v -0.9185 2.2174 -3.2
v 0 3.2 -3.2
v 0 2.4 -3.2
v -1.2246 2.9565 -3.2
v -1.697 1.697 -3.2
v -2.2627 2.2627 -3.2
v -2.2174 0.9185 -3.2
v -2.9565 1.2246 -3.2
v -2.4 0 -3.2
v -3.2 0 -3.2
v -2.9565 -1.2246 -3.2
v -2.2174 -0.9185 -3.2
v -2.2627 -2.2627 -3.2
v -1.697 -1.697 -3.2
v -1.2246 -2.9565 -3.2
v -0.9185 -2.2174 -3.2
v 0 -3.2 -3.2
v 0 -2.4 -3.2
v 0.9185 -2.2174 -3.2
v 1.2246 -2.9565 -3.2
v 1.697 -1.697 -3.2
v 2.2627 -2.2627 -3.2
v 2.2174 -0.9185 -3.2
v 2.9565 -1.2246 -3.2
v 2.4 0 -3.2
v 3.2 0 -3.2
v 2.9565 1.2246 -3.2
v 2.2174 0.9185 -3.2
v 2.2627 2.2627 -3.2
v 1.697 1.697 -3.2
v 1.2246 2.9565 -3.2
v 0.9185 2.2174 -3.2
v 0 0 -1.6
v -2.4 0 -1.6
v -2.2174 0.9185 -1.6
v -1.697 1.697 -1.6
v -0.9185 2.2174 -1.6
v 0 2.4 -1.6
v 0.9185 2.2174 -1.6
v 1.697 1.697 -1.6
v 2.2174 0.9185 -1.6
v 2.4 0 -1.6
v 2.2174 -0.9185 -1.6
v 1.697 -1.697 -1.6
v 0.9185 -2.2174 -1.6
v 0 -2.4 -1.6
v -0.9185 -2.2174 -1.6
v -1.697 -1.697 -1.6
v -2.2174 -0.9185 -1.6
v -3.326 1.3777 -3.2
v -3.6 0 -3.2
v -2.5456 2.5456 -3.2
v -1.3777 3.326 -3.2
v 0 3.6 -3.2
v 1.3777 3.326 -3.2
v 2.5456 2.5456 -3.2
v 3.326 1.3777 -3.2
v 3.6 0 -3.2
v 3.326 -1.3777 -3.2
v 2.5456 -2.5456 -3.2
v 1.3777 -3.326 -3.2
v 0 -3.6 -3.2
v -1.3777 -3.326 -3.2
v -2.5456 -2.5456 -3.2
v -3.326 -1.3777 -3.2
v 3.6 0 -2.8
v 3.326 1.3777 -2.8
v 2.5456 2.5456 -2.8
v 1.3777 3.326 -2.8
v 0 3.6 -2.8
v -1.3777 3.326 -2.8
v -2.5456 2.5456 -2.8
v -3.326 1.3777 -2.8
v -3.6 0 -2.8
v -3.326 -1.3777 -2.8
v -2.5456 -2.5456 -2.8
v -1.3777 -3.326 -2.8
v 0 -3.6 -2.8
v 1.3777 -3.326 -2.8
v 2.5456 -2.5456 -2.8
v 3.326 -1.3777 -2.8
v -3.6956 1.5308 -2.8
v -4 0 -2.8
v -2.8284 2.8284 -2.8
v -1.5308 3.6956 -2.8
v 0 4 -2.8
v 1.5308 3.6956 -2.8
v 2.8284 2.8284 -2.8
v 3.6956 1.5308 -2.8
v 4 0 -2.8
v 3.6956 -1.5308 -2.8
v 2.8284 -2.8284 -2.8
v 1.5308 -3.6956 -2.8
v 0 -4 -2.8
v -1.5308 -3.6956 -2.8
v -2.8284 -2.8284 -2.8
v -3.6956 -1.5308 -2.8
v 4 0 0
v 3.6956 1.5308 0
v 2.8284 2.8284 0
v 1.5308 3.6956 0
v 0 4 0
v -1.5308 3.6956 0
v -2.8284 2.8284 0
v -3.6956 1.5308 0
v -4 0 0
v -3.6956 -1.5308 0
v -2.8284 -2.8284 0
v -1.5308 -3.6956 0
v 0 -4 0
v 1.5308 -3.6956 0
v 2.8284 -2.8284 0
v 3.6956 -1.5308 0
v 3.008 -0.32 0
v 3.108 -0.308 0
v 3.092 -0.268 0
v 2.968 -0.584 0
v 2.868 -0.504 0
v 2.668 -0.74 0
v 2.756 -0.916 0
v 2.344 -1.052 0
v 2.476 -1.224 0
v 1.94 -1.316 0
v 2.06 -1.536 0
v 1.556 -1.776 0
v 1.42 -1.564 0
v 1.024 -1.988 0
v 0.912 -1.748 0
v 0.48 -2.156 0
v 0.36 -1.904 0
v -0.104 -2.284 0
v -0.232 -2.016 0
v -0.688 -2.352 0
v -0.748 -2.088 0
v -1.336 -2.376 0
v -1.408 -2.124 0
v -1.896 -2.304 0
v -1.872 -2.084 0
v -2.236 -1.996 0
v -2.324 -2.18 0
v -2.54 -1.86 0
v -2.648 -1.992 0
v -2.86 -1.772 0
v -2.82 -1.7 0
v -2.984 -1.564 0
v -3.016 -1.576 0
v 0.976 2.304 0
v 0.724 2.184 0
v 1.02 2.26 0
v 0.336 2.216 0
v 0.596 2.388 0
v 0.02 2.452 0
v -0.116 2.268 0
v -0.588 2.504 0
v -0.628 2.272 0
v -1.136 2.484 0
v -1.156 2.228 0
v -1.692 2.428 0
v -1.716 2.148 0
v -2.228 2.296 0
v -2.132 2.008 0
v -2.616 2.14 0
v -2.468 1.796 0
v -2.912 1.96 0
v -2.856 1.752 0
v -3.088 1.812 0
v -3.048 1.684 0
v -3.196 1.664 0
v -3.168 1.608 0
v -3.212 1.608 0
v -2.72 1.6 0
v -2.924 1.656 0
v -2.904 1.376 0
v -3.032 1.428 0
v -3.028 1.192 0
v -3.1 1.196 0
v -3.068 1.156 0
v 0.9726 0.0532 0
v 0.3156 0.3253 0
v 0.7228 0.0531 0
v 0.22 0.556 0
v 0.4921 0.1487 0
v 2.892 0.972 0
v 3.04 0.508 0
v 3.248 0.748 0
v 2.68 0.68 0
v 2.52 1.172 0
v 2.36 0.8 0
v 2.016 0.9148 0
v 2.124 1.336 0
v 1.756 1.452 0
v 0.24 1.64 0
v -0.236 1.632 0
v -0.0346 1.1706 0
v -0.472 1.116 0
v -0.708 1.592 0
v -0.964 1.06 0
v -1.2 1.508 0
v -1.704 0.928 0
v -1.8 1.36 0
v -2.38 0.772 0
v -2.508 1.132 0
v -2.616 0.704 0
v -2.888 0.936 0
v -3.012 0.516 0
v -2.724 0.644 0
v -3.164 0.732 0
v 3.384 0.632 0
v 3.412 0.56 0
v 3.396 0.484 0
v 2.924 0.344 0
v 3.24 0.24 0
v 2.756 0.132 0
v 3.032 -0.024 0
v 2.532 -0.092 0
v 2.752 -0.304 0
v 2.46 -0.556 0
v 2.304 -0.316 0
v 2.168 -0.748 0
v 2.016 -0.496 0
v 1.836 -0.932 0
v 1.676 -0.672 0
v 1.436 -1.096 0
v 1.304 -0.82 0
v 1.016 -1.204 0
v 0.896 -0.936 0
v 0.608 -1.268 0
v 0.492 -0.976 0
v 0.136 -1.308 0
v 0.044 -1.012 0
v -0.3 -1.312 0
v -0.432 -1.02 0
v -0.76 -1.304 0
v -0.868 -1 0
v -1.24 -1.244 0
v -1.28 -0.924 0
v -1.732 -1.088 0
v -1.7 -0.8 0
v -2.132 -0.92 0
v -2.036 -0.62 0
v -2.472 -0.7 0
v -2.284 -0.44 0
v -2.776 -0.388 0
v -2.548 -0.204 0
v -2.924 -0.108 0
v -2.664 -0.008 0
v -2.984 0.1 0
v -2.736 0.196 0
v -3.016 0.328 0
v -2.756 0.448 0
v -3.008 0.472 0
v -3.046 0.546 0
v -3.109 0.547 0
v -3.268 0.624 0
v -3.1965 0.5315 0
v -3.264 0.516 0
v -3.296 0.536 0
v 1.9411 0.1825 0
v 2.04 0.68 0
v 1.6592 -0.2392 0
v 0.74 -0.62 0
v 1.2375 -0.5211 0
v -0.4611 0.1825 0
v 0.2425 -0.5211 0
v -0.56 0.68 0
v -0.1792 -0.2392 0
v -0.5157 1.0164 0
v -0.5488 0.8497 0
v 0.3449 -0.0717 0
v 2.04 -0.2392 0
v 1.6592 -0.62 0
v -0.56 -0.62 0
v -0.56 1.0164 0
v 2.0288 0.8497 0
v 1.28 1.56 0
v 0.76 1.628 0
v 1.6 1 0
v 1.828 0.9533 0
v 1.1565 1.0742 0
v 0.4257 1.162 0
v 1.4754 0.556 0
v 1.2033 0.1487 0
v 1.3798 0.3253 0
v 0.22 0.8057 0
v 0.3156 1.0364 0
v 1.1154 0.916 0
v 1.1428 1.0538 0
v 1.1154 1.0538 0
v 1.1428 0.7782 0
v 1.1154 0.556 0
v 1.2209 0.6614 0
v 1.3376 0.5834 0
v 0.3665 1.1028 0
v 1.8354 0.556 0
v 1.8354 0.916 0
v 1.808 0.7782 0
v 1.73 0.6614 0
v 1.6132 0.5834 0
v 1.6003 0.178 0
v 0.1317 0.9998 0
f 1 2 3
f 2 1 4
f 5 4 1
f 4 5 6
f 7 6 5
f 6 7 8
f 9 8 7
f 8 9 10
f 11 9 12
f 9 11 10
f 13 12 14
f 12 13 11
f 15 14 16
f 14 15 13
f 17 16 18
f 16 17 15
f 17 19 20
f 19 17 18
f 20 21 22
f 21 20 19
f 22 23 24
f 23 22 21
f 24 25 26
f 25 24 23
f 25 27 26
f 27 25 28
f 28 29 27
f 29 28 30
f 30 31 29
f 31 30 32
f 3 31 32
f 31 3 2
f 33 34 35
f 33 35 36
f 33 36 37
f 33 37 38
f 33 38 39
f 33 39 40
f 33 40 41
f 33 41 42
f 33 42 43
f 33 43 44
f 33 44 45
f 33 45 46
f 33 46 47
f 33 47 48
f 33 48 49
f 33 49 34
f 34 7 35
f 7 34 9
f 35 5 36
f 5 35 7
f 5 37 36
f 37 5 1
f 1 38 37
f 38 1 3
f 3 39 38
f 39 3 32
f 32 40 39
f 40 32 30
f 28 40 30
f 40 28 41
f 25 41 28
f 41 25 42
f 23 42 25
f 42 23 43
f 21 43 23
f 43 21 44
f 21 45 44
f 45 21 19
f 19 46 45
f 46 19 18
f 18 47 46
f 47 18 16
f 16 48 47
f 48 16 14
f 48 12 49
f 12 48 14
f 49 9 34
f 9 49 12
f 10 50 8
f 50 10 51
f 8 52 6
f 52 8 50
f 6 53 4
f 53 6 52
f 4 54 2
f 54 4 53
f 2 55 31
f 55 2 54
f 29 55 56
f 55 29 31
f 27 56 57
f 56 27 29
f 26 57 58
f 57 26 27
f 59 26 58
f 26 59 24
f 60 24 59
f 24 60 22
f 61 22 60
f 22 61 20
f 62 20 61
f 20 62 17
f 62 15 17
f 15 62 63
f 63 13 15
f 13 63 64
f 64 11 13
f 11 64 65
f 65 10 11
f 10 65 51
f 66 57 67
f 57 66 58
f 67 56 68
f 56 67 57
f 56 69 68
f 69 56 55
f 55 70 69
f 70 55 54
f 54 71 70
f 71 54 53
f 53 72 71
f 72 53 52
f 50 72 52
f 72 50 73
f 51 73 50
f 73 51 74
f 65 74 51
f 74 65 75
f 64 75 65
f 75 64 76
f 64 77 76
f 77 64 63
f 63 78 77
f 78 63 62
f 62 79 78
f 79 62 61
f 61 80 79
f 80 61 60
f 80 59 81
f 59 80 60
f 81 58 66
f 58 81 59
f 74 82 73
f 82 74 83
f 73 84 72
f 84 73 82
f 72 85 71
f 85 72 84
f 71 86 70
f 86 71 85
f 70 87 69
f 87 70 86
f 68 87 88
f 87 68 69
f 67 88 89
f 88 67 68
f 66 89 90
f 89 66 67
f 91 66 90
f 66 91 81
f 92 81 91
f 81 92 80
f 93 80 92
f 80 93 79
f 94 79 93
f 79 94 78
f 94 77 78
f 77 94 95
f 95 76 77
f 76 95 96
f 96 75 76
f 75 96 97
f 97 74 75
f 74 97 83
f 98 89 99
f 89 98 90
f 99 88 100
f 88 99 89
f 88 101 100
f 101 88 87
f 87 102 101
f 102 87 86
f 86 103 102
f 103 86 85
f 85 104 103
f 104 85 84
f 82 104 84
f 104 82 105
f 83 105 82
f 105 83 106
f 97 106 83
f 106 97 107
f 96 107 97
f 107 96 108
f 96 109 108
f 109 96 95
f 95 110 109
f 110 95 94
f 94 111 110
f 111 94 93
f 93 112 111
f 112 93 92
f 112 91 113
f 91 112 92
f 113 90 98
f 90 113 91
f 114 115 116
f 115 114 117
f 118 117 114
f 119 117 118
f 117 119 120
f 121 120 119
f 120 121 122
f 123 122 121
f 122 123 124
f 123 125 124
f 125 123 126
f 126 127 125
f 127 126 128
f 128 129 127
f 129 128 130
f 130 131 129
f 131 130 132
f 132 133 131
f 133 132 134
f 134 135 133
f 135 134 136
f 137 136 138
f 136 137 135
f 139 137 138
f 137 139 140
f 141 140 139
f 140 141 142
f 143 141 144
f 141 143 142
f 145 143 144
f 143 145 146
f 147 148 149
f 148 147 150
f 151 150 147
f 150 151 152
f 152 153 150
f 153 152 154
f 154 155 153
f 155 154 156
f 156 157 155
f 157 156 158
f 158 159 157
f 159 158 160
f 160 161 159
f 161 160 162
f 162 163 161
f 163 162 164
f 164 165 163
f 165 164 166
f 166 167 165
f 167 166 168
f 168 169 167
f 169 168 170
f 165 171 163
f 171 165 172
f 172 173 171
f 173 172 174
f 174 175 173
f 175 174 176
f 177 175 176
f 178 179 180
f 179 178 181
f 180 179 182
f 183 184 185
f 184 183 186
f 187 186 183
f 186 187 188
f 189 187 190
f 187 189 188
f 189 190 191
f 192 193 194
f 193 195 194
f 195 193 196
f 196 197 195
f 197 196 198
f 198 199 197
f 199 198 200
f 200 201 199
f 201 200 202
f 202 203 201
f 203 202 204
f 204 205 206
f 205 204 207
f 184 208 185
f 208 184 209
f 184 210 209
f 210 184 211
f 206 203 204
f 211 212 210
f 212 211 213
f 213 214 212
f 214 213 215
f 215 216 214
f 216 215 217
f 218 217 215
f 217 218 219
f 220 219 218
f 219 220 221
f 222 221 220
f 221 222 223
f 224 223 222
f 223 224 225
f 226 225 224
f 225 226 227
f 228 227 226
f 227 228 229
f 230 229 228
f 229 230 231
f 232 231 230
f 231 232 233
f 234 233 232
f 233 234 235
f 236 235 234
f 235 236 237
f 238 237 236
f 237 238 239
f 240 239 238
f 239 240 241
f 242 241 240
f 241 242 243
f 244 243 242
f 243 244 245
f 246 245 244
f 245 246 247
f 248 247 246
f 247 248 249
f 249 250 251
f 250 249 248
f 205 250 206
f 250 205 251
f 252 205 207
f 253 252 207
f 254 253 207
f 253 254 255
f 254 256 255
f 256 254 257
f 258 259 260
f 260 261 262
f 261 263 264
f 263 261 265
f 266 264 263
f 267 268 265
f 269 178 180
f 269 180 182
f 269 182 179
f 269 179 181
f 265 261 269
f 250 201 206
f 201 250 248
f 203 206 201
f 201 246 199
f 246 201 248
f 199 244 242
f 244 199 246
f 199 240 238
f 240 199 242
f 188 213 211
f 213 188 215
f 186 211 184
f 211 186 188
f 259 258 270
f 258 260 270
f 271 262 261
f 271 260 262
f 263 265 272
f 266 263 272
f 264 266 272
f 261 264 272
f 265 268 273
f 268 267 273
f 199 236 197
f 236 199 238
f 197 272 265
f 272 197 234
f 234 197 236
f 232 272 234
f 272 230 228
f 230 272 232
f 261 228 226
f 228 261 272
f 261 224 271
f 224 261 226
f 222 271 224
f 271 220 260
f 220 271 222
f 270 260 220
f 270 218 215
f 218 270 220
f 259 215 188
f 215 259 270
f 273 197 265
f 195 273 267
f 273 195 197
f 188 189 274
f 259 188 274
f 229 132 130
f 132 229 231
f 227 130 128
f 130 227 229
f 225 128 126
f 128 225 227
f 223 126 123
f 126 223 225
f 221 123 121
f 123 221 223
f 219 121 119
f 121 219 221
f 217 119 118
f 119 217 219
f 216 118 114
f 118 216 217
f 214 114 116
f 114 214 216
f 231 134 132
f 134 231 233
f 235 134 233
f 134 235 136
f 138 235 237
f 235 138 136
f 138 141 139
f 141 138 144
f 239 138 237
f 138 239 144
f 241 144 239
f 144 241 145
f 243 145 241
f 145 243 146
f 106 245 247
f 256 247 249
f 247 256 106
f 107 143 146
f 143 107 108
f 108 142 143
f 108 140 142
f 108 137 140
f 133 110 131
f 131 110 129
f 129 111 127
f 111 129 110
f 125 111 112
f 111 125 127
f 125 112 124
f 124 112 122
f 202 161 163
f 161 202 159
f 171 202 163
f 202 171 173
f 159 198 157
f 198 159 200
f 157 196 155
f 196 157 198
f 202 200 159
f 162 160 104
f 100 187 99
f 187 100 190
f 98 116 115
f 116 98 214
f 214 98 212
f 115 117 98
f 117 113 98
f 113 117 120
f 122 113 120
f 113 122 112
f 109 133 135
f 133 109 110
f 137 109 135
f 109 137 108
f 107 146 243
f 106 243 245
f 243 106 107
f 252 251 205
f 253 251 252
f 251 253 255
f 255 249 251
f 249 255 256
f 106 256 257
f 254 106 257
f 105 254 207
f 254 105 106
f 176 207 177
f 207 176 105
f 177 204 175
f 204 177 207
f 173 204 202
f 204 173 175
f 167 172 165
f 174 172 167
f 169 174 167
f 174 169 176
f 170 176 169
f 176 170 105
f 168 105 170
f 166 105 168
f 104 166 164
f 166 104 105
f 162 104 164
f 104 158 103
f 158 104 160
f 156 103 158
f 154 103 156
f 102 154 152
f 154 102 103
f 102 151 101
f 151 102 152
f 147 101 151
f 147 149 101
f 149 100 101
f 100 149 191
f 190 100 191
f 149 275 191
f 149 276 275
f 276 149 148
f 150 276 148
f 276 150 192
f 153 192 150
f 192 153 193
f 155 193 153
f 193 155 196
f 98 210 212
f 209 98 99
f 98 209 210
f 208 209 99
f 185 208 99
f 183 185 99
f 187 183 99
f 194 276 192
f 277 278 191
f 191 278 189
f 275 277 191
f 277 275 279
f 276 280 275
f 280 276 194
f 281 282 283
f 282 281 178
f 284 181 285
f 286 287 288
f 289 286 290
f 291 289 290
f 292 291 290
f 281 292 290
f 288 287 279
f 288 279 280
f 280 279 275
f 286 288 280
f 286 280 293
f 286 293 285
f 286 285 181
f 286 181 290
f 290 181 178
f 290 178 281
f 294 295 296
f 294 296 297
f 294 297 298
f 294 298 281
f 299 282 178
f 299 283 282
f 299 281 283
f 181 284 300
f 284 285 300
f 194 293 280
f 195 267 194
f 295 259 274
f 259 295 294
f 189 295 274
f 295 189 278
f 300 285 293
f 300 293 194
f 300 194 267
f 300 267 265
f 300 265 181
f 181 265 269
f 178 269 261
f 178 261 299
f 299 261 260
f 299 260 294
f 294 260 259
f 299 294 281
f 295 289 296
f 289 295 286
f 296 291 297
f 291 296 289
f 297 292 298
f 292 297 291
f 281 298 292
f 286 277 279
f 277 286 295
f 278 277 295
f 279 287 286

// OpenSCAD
use <../lib.scad>
use <../p/1-16chrd.scad>
use <../p/1-16tndis.scad>
use <../p/1-4ndis.scad>
use <../p/1-8chrd.scad>
use <../p/1-8tndis.scad>
use <../p/2-4chrd.scad>
use <../p/3-16chrd.scad>
use <../p/3-16ndis.scad>
use <s/98138pxls01.scad>
use <s/98138s02.scad>
function ldraw_lib__98138pxm() = [
// 0 Tile  1 x  1 Round with Squinting Eye with Medium Blue Iris and Medium Nougat Wrinkles Right Pattern
// 0 Name: 98138pxm.dat
// 0 Author: Gerald Lasser [GeraldLasser]
// 0 !LDRAW_ORG Part UPDATE 2025-07
// 0 !LICENSE Licensed under CC BY 4.0 : see CAreadme.txt
// 
// 0 BFC CERTIFY CCW
  [0,"BFC","CERTIFY"],
  [0,"BFC","CCW"],
// 
// 0 !KEYWORDS Bricklink 98138pb414R, Despicable Me, Gru, Minions
// 0 !KEYWORDS Rebrickable 98138pr0397, Set 75582
// 
// 0 !HISTORY 2025-07-27 [OrionP] Official Update 2025-07
// 
// 1 16 0 0 0 1 0 0 0 1 0 0 0 1 s\98138s02.dat
  [1,16,0,0,0,1,0,0,0,1,0,0,0,1, ldraw_lib__s__98138s02()],
// 1 16 0 0 0 -1 0 0 0 1 0 0 0 1 s\98138pxls01.dat
  [1,16,0,0,0,-1,0,0,0,1,0,0,0,1, ldraw_lib__s__98138pxls01()],
// 
// 3 0 4 0 2.5 4.57006 0 2.38325 4.39 0 3.63
  [3,0,4,0,2.5,4.57006,0,2.38325,4.39,0,3.63],
// 3 0 4.39 0 3.63 4.57006 0 2.38325 5.04 0 2.287
  [3,0,4.39,0,3.63,4.57006,0,2.38325,5.04,0,2.287],
// 4 0 4 0 2.5 4.39 0 3.63 3.2 0 3.9 2.89116 0 2.68541
  [4,0,4,0,2.5,4.39,0,3.63,3.2,0,3.9,2.89116,0,2.68541],
// 4 0 -.08639 0 2.92639 1.06436 0 2.90501 3.2 0 3.9 1.9 0 4.07
  [4,0,-.08639,0,2.92639,1.06436,0,2.90501,3.2,0,3.9,1.9,0,4.07],
// 1 0 2.11926 0 1.70214 .31214 0 1.56926 0 1 0 -1.56926 0 .31214 3-16chrd.dat
  [1,0,2.11926,0,1.70214,.31214,0,1.56926,0,1,0,-1.56926,0,.31214, ldraw_lib__3_16chrd()],
// 1 0 2.11926 0 1.70214 -1.56926 0 -.31214 0 1 0 -.31214 0 1.56926 1-8chrd.dat
  [1,0,2.11926,0,1.70214,-1.56926,0,-.31214,0,1,0,-.31214,0,1.56926, ldraw_lib__1_8chrd()],
// 1 0 3.68855 0 2.28997 -.9 0 0 0 1 0 0 0 .9 1-16tndis.dat
  [1,0,3.68855,0,2.28997,-.9,0,0,0,1,0,0,0,.9, ldraw_lib__1_16tndis()],
// 1 0 3.68855 0 2.28997 -.9 0 0 0 1 0 0 0 -.9 1-4ndis.dat
  [1,0,3.68855,0,2.28997,-.9,0,0,0,1,0,0,0,-.9, ldraw_lib__1_4ndis()],
// 3 0 2.78855 0 2.6344 2.85704 0 2.6344 2.89116 0 2.68541
  [3,0,2.78855,0,2.6344,2.85704,0,2.6344,2.89116,0,2.68541],
// 3 0 2.78855 0 2.6344 2.89116 0 2.68541 1.06436 0 2.90501
  [3,0,2.78855,0,2.6344,2.89116,0,2.68541,1.06436,0,2.90501],
// 3 0 1.06436 0 2.90501 2.89116 0 2.68541 3.2 0 3.9
  [3,0,1.06436,0,2.90501,2.89116,0,2.68541,3.2,0,3.9],
// 3 0 2.78855 0 2.28997 2.78855 0 2.6344 1.06436 0 2.90501
  [3,0,2.78855,0,2.28997,2.78855,0,2.6344,1.06436,0,2.90501],
// 3 0 2.78855 0 2.28997 1.06436 0 2.90501 .91628 0 2.75712
  [3,0,2.78855,0,2.28997,1.06436,0,2.90501,.91628,0,2.75712],
// 3 0 2.78855 0 2.28997 .91628 0 2.75712 .78892 0 2.59105
  [3,0,2.78855,0,2.28997,.91628,0,2.75712,.78892,0,2.59105],
// 3 0 2.78855 0 2.28997 .78892 0 2.59105 .55 0 1.39
  [3,0,2.78855,0,2.28997,.78892,0,2.59105,.55,0,1.39],
// 3 0 2.78855 0 2.28997 .55 0 1.39 2.78855 0 1.38997
  [3,0,2.78855,0,2.28997,.55,0,1.39,2.78855,0,1.38997],
// 3 0 2.78855 0 1.38997 .55 0 1.39 2.4314 0 .13288
  [3,0,2.78855,0,1.38997,.55,0,1.39,2.4314,0,.13288],
// 3 0 2.78855 0 1.38997 2.4314 0 .13288 3.68855 0 1.38997
  [3,0,2.78855,0,1.38997,2.4314,0,.13288,3.68855,0,1.38997],
// 
// 1 73 3.68855 0 2.28997 .9 0 0 0 1 0 0 0 -.9 1-4ndis.dat
  [1,73,3.68855,0,2.28997,.9,0,0,0,1,0,0,0,-.9, ldraw_lib__1_4ndis()],
// 1 73 2.11926 0 1.70214 .31214 0 1.56926 0 1 0 -1.56926 0 .31214 3-16ndis.dat
  [1,73,2.11926,0,1.70214,.31214,0,1.56926,0,1,0,-1.56926,0,.31214, ldraw_lib__3_16ndis()],
// 1 73 2.11926 0 1.70214 -1.56926 0 -.31214 0 1 0 -.31214 0 1.56926 1-8tndis.dat
  [1,73,2.11926,0,1.70214,-1.56926,0,-.31214,0,1,0,-.31214,0,1.56926, ldraw_lib__1_8tndis()],
// 3 73 -.08639 0 2.92639 .91628 0 2.75712 1.06436 0 2.90501
  [3,73,-.08639,0,2.92639,.91628,0,2.75712,1.06436,0,2.90501],
// 3 73 -1.18 0 2.79 -1.28918 0 2.5411 -.08639 0 2.92639
  [3,73,-1.18,0,2.79,-1.28918,0,2.5411,-.08639,0,2.92639],
// 4 73 4.5886 0 1.39 5.1 0 1.7 5.07205 0 2.12413 4.5886 0 2.29
  [4,73,4.5886,0,1.39,5.1,0,1.7,5.07205,0,2.12413,4.5886,0,2.29],
// 4 73 5.04 0 2.287 4.57006 0 2.38325 4.5886 0 2.29 5.07205 0 2.12413
  [4,73,5.04,0,2.287,4.57006,0,2.38325,4.5886,0,2.29,5.07205,0,2.12413],
// 3 73 .32929 0 2.49962 .78892 0 2.59105 .91628 0 2.75712
  [3,73,.32929,0,2.49962,.78892,0,2.59105,.91628,0,2.75712],
// 3 73 .32929 0 2.49962 .91628 0 2.75712 -.08639 0 2.92639
  [3,73,.32929,0,2.49962,.91628,0,2.75712,-.08639,0,2.92639],
// 3 73 .32929 0 2.49962 -.08639 0 2.92639 -1.28918 0 2.5411
  [3,73,.32929,0,2.49962,-.08639,0,2.92639,-1.28918,0,2.5411],
// 3 73 .32929 0 2.49962 -1.28918 0 2.5411 -1.4 0 1.7
  [3,73,.32929,0,2.49962,-1.28918,0,2.5411,-1.4,0,1.7],
// 3 73 .32929 0 2.49962 -1.4 0 1.7 .55 0 1.39
  [3,73,.32929,0,2.49962,-1.4,0,1.7,.55,0,1.39],
// 3 73 .55 0 1.39 -1.4 0 1.7 .86214 0 -.17926
  [3,73,.55,0,1.39,-1.4,0,1.7,.86214,0,-.17926],
// 3 73 2.4314 0 .13288 .86214 0 -.17926 1.85 0 -1.55
  [3,73,2.4314,0,.13288,.86214,0,-.17926,1.85,0,-1.55],
// 3 73 2.4314 0 .13288 1.85 0 -1.55 4.00066 0 .44502
  [3,73,2.4314,0,.13288,1.85,0,-1.55,4.00066,0,.44502],
// 3 73 4.00066 0 .44502 1.85 0 -1.55 4.14808 0 -.59808
  [3,73,4.00066,0,.44502,1.85,0,-1.55,4.14808,0,-.59808],
// 3 73 4.00066 0 .44502 4.14808 0 -.59808 4.58855 0 1.38997
  [3,73,4.00066,0,.44502,4.14808,0,-.59808,4.58855,0,1.38997],
// 3 73 4.58855 0 1.38997 4.14808 0 -.59808 5.1 0 1.7
  [3,73,4.58855,0,1.38997,4.14808,0,-.59808,5.1,0,1.7],
// 3 73 4.00066 0 .44502 4.58855 0 1.38997 3.68855 0 1.38997
  [3,73,4.00066,0,.44502,4.58855,0,1.38997,3.68855,0,1.38997],
// 
// 1 15 3.68855 0 2.28997 -.9 0 0 0 1 0 0 0 -.9 2-4chrd.dat
  [1,15,3.68855,0,2.28997,-.9,0,0,0,1,0,0,0,-.9, ldraw_lib__2_4chrd()],
// 1 15 3.68855 0 2.28997 -.9 0 0 0 1 0 0 0 .9 1-16chrd.dat
  [1,15,3.68855,0,2.28997,-.9,0,0,0,1,0,0,0,.9, ldraw_lib__1_16chrd()],
// 4 15 4 0 2.5 2.89116 0 2.68541 2.7886 0 2.29 4.5886 0 2.29
  [4,15,4,0,2.5,2.89116,0,2.68541,2.7886,0,2.29,4.5886,0,2.29],
// 3 15 4.57006 0 2.38325 4 0 2.5 4.5886 0 2.29
  [3,15,4.57006,0,2.38325,4,0,2.5,4.5886,0,2.29],
// 3 15 2.89116 0 2.68541 2.85704 0 2.6344 2.78855 0 2.28997
  [3,15,2.89116,0,2.68541,2.85704,0,2.6344,2.78855,0,2.28997],
];
module ldraw_lib__98138pxm(step=0, col=false, unit=2/5, alt=false, line=0.2, solid=!$preview)
    makepoly(ldraw_lib__98138pxm(), step=step, col=col, unit=unit, alt=alt, line=line, solid=solid);
ldraw_lib__98138pxm(line=0.2);
